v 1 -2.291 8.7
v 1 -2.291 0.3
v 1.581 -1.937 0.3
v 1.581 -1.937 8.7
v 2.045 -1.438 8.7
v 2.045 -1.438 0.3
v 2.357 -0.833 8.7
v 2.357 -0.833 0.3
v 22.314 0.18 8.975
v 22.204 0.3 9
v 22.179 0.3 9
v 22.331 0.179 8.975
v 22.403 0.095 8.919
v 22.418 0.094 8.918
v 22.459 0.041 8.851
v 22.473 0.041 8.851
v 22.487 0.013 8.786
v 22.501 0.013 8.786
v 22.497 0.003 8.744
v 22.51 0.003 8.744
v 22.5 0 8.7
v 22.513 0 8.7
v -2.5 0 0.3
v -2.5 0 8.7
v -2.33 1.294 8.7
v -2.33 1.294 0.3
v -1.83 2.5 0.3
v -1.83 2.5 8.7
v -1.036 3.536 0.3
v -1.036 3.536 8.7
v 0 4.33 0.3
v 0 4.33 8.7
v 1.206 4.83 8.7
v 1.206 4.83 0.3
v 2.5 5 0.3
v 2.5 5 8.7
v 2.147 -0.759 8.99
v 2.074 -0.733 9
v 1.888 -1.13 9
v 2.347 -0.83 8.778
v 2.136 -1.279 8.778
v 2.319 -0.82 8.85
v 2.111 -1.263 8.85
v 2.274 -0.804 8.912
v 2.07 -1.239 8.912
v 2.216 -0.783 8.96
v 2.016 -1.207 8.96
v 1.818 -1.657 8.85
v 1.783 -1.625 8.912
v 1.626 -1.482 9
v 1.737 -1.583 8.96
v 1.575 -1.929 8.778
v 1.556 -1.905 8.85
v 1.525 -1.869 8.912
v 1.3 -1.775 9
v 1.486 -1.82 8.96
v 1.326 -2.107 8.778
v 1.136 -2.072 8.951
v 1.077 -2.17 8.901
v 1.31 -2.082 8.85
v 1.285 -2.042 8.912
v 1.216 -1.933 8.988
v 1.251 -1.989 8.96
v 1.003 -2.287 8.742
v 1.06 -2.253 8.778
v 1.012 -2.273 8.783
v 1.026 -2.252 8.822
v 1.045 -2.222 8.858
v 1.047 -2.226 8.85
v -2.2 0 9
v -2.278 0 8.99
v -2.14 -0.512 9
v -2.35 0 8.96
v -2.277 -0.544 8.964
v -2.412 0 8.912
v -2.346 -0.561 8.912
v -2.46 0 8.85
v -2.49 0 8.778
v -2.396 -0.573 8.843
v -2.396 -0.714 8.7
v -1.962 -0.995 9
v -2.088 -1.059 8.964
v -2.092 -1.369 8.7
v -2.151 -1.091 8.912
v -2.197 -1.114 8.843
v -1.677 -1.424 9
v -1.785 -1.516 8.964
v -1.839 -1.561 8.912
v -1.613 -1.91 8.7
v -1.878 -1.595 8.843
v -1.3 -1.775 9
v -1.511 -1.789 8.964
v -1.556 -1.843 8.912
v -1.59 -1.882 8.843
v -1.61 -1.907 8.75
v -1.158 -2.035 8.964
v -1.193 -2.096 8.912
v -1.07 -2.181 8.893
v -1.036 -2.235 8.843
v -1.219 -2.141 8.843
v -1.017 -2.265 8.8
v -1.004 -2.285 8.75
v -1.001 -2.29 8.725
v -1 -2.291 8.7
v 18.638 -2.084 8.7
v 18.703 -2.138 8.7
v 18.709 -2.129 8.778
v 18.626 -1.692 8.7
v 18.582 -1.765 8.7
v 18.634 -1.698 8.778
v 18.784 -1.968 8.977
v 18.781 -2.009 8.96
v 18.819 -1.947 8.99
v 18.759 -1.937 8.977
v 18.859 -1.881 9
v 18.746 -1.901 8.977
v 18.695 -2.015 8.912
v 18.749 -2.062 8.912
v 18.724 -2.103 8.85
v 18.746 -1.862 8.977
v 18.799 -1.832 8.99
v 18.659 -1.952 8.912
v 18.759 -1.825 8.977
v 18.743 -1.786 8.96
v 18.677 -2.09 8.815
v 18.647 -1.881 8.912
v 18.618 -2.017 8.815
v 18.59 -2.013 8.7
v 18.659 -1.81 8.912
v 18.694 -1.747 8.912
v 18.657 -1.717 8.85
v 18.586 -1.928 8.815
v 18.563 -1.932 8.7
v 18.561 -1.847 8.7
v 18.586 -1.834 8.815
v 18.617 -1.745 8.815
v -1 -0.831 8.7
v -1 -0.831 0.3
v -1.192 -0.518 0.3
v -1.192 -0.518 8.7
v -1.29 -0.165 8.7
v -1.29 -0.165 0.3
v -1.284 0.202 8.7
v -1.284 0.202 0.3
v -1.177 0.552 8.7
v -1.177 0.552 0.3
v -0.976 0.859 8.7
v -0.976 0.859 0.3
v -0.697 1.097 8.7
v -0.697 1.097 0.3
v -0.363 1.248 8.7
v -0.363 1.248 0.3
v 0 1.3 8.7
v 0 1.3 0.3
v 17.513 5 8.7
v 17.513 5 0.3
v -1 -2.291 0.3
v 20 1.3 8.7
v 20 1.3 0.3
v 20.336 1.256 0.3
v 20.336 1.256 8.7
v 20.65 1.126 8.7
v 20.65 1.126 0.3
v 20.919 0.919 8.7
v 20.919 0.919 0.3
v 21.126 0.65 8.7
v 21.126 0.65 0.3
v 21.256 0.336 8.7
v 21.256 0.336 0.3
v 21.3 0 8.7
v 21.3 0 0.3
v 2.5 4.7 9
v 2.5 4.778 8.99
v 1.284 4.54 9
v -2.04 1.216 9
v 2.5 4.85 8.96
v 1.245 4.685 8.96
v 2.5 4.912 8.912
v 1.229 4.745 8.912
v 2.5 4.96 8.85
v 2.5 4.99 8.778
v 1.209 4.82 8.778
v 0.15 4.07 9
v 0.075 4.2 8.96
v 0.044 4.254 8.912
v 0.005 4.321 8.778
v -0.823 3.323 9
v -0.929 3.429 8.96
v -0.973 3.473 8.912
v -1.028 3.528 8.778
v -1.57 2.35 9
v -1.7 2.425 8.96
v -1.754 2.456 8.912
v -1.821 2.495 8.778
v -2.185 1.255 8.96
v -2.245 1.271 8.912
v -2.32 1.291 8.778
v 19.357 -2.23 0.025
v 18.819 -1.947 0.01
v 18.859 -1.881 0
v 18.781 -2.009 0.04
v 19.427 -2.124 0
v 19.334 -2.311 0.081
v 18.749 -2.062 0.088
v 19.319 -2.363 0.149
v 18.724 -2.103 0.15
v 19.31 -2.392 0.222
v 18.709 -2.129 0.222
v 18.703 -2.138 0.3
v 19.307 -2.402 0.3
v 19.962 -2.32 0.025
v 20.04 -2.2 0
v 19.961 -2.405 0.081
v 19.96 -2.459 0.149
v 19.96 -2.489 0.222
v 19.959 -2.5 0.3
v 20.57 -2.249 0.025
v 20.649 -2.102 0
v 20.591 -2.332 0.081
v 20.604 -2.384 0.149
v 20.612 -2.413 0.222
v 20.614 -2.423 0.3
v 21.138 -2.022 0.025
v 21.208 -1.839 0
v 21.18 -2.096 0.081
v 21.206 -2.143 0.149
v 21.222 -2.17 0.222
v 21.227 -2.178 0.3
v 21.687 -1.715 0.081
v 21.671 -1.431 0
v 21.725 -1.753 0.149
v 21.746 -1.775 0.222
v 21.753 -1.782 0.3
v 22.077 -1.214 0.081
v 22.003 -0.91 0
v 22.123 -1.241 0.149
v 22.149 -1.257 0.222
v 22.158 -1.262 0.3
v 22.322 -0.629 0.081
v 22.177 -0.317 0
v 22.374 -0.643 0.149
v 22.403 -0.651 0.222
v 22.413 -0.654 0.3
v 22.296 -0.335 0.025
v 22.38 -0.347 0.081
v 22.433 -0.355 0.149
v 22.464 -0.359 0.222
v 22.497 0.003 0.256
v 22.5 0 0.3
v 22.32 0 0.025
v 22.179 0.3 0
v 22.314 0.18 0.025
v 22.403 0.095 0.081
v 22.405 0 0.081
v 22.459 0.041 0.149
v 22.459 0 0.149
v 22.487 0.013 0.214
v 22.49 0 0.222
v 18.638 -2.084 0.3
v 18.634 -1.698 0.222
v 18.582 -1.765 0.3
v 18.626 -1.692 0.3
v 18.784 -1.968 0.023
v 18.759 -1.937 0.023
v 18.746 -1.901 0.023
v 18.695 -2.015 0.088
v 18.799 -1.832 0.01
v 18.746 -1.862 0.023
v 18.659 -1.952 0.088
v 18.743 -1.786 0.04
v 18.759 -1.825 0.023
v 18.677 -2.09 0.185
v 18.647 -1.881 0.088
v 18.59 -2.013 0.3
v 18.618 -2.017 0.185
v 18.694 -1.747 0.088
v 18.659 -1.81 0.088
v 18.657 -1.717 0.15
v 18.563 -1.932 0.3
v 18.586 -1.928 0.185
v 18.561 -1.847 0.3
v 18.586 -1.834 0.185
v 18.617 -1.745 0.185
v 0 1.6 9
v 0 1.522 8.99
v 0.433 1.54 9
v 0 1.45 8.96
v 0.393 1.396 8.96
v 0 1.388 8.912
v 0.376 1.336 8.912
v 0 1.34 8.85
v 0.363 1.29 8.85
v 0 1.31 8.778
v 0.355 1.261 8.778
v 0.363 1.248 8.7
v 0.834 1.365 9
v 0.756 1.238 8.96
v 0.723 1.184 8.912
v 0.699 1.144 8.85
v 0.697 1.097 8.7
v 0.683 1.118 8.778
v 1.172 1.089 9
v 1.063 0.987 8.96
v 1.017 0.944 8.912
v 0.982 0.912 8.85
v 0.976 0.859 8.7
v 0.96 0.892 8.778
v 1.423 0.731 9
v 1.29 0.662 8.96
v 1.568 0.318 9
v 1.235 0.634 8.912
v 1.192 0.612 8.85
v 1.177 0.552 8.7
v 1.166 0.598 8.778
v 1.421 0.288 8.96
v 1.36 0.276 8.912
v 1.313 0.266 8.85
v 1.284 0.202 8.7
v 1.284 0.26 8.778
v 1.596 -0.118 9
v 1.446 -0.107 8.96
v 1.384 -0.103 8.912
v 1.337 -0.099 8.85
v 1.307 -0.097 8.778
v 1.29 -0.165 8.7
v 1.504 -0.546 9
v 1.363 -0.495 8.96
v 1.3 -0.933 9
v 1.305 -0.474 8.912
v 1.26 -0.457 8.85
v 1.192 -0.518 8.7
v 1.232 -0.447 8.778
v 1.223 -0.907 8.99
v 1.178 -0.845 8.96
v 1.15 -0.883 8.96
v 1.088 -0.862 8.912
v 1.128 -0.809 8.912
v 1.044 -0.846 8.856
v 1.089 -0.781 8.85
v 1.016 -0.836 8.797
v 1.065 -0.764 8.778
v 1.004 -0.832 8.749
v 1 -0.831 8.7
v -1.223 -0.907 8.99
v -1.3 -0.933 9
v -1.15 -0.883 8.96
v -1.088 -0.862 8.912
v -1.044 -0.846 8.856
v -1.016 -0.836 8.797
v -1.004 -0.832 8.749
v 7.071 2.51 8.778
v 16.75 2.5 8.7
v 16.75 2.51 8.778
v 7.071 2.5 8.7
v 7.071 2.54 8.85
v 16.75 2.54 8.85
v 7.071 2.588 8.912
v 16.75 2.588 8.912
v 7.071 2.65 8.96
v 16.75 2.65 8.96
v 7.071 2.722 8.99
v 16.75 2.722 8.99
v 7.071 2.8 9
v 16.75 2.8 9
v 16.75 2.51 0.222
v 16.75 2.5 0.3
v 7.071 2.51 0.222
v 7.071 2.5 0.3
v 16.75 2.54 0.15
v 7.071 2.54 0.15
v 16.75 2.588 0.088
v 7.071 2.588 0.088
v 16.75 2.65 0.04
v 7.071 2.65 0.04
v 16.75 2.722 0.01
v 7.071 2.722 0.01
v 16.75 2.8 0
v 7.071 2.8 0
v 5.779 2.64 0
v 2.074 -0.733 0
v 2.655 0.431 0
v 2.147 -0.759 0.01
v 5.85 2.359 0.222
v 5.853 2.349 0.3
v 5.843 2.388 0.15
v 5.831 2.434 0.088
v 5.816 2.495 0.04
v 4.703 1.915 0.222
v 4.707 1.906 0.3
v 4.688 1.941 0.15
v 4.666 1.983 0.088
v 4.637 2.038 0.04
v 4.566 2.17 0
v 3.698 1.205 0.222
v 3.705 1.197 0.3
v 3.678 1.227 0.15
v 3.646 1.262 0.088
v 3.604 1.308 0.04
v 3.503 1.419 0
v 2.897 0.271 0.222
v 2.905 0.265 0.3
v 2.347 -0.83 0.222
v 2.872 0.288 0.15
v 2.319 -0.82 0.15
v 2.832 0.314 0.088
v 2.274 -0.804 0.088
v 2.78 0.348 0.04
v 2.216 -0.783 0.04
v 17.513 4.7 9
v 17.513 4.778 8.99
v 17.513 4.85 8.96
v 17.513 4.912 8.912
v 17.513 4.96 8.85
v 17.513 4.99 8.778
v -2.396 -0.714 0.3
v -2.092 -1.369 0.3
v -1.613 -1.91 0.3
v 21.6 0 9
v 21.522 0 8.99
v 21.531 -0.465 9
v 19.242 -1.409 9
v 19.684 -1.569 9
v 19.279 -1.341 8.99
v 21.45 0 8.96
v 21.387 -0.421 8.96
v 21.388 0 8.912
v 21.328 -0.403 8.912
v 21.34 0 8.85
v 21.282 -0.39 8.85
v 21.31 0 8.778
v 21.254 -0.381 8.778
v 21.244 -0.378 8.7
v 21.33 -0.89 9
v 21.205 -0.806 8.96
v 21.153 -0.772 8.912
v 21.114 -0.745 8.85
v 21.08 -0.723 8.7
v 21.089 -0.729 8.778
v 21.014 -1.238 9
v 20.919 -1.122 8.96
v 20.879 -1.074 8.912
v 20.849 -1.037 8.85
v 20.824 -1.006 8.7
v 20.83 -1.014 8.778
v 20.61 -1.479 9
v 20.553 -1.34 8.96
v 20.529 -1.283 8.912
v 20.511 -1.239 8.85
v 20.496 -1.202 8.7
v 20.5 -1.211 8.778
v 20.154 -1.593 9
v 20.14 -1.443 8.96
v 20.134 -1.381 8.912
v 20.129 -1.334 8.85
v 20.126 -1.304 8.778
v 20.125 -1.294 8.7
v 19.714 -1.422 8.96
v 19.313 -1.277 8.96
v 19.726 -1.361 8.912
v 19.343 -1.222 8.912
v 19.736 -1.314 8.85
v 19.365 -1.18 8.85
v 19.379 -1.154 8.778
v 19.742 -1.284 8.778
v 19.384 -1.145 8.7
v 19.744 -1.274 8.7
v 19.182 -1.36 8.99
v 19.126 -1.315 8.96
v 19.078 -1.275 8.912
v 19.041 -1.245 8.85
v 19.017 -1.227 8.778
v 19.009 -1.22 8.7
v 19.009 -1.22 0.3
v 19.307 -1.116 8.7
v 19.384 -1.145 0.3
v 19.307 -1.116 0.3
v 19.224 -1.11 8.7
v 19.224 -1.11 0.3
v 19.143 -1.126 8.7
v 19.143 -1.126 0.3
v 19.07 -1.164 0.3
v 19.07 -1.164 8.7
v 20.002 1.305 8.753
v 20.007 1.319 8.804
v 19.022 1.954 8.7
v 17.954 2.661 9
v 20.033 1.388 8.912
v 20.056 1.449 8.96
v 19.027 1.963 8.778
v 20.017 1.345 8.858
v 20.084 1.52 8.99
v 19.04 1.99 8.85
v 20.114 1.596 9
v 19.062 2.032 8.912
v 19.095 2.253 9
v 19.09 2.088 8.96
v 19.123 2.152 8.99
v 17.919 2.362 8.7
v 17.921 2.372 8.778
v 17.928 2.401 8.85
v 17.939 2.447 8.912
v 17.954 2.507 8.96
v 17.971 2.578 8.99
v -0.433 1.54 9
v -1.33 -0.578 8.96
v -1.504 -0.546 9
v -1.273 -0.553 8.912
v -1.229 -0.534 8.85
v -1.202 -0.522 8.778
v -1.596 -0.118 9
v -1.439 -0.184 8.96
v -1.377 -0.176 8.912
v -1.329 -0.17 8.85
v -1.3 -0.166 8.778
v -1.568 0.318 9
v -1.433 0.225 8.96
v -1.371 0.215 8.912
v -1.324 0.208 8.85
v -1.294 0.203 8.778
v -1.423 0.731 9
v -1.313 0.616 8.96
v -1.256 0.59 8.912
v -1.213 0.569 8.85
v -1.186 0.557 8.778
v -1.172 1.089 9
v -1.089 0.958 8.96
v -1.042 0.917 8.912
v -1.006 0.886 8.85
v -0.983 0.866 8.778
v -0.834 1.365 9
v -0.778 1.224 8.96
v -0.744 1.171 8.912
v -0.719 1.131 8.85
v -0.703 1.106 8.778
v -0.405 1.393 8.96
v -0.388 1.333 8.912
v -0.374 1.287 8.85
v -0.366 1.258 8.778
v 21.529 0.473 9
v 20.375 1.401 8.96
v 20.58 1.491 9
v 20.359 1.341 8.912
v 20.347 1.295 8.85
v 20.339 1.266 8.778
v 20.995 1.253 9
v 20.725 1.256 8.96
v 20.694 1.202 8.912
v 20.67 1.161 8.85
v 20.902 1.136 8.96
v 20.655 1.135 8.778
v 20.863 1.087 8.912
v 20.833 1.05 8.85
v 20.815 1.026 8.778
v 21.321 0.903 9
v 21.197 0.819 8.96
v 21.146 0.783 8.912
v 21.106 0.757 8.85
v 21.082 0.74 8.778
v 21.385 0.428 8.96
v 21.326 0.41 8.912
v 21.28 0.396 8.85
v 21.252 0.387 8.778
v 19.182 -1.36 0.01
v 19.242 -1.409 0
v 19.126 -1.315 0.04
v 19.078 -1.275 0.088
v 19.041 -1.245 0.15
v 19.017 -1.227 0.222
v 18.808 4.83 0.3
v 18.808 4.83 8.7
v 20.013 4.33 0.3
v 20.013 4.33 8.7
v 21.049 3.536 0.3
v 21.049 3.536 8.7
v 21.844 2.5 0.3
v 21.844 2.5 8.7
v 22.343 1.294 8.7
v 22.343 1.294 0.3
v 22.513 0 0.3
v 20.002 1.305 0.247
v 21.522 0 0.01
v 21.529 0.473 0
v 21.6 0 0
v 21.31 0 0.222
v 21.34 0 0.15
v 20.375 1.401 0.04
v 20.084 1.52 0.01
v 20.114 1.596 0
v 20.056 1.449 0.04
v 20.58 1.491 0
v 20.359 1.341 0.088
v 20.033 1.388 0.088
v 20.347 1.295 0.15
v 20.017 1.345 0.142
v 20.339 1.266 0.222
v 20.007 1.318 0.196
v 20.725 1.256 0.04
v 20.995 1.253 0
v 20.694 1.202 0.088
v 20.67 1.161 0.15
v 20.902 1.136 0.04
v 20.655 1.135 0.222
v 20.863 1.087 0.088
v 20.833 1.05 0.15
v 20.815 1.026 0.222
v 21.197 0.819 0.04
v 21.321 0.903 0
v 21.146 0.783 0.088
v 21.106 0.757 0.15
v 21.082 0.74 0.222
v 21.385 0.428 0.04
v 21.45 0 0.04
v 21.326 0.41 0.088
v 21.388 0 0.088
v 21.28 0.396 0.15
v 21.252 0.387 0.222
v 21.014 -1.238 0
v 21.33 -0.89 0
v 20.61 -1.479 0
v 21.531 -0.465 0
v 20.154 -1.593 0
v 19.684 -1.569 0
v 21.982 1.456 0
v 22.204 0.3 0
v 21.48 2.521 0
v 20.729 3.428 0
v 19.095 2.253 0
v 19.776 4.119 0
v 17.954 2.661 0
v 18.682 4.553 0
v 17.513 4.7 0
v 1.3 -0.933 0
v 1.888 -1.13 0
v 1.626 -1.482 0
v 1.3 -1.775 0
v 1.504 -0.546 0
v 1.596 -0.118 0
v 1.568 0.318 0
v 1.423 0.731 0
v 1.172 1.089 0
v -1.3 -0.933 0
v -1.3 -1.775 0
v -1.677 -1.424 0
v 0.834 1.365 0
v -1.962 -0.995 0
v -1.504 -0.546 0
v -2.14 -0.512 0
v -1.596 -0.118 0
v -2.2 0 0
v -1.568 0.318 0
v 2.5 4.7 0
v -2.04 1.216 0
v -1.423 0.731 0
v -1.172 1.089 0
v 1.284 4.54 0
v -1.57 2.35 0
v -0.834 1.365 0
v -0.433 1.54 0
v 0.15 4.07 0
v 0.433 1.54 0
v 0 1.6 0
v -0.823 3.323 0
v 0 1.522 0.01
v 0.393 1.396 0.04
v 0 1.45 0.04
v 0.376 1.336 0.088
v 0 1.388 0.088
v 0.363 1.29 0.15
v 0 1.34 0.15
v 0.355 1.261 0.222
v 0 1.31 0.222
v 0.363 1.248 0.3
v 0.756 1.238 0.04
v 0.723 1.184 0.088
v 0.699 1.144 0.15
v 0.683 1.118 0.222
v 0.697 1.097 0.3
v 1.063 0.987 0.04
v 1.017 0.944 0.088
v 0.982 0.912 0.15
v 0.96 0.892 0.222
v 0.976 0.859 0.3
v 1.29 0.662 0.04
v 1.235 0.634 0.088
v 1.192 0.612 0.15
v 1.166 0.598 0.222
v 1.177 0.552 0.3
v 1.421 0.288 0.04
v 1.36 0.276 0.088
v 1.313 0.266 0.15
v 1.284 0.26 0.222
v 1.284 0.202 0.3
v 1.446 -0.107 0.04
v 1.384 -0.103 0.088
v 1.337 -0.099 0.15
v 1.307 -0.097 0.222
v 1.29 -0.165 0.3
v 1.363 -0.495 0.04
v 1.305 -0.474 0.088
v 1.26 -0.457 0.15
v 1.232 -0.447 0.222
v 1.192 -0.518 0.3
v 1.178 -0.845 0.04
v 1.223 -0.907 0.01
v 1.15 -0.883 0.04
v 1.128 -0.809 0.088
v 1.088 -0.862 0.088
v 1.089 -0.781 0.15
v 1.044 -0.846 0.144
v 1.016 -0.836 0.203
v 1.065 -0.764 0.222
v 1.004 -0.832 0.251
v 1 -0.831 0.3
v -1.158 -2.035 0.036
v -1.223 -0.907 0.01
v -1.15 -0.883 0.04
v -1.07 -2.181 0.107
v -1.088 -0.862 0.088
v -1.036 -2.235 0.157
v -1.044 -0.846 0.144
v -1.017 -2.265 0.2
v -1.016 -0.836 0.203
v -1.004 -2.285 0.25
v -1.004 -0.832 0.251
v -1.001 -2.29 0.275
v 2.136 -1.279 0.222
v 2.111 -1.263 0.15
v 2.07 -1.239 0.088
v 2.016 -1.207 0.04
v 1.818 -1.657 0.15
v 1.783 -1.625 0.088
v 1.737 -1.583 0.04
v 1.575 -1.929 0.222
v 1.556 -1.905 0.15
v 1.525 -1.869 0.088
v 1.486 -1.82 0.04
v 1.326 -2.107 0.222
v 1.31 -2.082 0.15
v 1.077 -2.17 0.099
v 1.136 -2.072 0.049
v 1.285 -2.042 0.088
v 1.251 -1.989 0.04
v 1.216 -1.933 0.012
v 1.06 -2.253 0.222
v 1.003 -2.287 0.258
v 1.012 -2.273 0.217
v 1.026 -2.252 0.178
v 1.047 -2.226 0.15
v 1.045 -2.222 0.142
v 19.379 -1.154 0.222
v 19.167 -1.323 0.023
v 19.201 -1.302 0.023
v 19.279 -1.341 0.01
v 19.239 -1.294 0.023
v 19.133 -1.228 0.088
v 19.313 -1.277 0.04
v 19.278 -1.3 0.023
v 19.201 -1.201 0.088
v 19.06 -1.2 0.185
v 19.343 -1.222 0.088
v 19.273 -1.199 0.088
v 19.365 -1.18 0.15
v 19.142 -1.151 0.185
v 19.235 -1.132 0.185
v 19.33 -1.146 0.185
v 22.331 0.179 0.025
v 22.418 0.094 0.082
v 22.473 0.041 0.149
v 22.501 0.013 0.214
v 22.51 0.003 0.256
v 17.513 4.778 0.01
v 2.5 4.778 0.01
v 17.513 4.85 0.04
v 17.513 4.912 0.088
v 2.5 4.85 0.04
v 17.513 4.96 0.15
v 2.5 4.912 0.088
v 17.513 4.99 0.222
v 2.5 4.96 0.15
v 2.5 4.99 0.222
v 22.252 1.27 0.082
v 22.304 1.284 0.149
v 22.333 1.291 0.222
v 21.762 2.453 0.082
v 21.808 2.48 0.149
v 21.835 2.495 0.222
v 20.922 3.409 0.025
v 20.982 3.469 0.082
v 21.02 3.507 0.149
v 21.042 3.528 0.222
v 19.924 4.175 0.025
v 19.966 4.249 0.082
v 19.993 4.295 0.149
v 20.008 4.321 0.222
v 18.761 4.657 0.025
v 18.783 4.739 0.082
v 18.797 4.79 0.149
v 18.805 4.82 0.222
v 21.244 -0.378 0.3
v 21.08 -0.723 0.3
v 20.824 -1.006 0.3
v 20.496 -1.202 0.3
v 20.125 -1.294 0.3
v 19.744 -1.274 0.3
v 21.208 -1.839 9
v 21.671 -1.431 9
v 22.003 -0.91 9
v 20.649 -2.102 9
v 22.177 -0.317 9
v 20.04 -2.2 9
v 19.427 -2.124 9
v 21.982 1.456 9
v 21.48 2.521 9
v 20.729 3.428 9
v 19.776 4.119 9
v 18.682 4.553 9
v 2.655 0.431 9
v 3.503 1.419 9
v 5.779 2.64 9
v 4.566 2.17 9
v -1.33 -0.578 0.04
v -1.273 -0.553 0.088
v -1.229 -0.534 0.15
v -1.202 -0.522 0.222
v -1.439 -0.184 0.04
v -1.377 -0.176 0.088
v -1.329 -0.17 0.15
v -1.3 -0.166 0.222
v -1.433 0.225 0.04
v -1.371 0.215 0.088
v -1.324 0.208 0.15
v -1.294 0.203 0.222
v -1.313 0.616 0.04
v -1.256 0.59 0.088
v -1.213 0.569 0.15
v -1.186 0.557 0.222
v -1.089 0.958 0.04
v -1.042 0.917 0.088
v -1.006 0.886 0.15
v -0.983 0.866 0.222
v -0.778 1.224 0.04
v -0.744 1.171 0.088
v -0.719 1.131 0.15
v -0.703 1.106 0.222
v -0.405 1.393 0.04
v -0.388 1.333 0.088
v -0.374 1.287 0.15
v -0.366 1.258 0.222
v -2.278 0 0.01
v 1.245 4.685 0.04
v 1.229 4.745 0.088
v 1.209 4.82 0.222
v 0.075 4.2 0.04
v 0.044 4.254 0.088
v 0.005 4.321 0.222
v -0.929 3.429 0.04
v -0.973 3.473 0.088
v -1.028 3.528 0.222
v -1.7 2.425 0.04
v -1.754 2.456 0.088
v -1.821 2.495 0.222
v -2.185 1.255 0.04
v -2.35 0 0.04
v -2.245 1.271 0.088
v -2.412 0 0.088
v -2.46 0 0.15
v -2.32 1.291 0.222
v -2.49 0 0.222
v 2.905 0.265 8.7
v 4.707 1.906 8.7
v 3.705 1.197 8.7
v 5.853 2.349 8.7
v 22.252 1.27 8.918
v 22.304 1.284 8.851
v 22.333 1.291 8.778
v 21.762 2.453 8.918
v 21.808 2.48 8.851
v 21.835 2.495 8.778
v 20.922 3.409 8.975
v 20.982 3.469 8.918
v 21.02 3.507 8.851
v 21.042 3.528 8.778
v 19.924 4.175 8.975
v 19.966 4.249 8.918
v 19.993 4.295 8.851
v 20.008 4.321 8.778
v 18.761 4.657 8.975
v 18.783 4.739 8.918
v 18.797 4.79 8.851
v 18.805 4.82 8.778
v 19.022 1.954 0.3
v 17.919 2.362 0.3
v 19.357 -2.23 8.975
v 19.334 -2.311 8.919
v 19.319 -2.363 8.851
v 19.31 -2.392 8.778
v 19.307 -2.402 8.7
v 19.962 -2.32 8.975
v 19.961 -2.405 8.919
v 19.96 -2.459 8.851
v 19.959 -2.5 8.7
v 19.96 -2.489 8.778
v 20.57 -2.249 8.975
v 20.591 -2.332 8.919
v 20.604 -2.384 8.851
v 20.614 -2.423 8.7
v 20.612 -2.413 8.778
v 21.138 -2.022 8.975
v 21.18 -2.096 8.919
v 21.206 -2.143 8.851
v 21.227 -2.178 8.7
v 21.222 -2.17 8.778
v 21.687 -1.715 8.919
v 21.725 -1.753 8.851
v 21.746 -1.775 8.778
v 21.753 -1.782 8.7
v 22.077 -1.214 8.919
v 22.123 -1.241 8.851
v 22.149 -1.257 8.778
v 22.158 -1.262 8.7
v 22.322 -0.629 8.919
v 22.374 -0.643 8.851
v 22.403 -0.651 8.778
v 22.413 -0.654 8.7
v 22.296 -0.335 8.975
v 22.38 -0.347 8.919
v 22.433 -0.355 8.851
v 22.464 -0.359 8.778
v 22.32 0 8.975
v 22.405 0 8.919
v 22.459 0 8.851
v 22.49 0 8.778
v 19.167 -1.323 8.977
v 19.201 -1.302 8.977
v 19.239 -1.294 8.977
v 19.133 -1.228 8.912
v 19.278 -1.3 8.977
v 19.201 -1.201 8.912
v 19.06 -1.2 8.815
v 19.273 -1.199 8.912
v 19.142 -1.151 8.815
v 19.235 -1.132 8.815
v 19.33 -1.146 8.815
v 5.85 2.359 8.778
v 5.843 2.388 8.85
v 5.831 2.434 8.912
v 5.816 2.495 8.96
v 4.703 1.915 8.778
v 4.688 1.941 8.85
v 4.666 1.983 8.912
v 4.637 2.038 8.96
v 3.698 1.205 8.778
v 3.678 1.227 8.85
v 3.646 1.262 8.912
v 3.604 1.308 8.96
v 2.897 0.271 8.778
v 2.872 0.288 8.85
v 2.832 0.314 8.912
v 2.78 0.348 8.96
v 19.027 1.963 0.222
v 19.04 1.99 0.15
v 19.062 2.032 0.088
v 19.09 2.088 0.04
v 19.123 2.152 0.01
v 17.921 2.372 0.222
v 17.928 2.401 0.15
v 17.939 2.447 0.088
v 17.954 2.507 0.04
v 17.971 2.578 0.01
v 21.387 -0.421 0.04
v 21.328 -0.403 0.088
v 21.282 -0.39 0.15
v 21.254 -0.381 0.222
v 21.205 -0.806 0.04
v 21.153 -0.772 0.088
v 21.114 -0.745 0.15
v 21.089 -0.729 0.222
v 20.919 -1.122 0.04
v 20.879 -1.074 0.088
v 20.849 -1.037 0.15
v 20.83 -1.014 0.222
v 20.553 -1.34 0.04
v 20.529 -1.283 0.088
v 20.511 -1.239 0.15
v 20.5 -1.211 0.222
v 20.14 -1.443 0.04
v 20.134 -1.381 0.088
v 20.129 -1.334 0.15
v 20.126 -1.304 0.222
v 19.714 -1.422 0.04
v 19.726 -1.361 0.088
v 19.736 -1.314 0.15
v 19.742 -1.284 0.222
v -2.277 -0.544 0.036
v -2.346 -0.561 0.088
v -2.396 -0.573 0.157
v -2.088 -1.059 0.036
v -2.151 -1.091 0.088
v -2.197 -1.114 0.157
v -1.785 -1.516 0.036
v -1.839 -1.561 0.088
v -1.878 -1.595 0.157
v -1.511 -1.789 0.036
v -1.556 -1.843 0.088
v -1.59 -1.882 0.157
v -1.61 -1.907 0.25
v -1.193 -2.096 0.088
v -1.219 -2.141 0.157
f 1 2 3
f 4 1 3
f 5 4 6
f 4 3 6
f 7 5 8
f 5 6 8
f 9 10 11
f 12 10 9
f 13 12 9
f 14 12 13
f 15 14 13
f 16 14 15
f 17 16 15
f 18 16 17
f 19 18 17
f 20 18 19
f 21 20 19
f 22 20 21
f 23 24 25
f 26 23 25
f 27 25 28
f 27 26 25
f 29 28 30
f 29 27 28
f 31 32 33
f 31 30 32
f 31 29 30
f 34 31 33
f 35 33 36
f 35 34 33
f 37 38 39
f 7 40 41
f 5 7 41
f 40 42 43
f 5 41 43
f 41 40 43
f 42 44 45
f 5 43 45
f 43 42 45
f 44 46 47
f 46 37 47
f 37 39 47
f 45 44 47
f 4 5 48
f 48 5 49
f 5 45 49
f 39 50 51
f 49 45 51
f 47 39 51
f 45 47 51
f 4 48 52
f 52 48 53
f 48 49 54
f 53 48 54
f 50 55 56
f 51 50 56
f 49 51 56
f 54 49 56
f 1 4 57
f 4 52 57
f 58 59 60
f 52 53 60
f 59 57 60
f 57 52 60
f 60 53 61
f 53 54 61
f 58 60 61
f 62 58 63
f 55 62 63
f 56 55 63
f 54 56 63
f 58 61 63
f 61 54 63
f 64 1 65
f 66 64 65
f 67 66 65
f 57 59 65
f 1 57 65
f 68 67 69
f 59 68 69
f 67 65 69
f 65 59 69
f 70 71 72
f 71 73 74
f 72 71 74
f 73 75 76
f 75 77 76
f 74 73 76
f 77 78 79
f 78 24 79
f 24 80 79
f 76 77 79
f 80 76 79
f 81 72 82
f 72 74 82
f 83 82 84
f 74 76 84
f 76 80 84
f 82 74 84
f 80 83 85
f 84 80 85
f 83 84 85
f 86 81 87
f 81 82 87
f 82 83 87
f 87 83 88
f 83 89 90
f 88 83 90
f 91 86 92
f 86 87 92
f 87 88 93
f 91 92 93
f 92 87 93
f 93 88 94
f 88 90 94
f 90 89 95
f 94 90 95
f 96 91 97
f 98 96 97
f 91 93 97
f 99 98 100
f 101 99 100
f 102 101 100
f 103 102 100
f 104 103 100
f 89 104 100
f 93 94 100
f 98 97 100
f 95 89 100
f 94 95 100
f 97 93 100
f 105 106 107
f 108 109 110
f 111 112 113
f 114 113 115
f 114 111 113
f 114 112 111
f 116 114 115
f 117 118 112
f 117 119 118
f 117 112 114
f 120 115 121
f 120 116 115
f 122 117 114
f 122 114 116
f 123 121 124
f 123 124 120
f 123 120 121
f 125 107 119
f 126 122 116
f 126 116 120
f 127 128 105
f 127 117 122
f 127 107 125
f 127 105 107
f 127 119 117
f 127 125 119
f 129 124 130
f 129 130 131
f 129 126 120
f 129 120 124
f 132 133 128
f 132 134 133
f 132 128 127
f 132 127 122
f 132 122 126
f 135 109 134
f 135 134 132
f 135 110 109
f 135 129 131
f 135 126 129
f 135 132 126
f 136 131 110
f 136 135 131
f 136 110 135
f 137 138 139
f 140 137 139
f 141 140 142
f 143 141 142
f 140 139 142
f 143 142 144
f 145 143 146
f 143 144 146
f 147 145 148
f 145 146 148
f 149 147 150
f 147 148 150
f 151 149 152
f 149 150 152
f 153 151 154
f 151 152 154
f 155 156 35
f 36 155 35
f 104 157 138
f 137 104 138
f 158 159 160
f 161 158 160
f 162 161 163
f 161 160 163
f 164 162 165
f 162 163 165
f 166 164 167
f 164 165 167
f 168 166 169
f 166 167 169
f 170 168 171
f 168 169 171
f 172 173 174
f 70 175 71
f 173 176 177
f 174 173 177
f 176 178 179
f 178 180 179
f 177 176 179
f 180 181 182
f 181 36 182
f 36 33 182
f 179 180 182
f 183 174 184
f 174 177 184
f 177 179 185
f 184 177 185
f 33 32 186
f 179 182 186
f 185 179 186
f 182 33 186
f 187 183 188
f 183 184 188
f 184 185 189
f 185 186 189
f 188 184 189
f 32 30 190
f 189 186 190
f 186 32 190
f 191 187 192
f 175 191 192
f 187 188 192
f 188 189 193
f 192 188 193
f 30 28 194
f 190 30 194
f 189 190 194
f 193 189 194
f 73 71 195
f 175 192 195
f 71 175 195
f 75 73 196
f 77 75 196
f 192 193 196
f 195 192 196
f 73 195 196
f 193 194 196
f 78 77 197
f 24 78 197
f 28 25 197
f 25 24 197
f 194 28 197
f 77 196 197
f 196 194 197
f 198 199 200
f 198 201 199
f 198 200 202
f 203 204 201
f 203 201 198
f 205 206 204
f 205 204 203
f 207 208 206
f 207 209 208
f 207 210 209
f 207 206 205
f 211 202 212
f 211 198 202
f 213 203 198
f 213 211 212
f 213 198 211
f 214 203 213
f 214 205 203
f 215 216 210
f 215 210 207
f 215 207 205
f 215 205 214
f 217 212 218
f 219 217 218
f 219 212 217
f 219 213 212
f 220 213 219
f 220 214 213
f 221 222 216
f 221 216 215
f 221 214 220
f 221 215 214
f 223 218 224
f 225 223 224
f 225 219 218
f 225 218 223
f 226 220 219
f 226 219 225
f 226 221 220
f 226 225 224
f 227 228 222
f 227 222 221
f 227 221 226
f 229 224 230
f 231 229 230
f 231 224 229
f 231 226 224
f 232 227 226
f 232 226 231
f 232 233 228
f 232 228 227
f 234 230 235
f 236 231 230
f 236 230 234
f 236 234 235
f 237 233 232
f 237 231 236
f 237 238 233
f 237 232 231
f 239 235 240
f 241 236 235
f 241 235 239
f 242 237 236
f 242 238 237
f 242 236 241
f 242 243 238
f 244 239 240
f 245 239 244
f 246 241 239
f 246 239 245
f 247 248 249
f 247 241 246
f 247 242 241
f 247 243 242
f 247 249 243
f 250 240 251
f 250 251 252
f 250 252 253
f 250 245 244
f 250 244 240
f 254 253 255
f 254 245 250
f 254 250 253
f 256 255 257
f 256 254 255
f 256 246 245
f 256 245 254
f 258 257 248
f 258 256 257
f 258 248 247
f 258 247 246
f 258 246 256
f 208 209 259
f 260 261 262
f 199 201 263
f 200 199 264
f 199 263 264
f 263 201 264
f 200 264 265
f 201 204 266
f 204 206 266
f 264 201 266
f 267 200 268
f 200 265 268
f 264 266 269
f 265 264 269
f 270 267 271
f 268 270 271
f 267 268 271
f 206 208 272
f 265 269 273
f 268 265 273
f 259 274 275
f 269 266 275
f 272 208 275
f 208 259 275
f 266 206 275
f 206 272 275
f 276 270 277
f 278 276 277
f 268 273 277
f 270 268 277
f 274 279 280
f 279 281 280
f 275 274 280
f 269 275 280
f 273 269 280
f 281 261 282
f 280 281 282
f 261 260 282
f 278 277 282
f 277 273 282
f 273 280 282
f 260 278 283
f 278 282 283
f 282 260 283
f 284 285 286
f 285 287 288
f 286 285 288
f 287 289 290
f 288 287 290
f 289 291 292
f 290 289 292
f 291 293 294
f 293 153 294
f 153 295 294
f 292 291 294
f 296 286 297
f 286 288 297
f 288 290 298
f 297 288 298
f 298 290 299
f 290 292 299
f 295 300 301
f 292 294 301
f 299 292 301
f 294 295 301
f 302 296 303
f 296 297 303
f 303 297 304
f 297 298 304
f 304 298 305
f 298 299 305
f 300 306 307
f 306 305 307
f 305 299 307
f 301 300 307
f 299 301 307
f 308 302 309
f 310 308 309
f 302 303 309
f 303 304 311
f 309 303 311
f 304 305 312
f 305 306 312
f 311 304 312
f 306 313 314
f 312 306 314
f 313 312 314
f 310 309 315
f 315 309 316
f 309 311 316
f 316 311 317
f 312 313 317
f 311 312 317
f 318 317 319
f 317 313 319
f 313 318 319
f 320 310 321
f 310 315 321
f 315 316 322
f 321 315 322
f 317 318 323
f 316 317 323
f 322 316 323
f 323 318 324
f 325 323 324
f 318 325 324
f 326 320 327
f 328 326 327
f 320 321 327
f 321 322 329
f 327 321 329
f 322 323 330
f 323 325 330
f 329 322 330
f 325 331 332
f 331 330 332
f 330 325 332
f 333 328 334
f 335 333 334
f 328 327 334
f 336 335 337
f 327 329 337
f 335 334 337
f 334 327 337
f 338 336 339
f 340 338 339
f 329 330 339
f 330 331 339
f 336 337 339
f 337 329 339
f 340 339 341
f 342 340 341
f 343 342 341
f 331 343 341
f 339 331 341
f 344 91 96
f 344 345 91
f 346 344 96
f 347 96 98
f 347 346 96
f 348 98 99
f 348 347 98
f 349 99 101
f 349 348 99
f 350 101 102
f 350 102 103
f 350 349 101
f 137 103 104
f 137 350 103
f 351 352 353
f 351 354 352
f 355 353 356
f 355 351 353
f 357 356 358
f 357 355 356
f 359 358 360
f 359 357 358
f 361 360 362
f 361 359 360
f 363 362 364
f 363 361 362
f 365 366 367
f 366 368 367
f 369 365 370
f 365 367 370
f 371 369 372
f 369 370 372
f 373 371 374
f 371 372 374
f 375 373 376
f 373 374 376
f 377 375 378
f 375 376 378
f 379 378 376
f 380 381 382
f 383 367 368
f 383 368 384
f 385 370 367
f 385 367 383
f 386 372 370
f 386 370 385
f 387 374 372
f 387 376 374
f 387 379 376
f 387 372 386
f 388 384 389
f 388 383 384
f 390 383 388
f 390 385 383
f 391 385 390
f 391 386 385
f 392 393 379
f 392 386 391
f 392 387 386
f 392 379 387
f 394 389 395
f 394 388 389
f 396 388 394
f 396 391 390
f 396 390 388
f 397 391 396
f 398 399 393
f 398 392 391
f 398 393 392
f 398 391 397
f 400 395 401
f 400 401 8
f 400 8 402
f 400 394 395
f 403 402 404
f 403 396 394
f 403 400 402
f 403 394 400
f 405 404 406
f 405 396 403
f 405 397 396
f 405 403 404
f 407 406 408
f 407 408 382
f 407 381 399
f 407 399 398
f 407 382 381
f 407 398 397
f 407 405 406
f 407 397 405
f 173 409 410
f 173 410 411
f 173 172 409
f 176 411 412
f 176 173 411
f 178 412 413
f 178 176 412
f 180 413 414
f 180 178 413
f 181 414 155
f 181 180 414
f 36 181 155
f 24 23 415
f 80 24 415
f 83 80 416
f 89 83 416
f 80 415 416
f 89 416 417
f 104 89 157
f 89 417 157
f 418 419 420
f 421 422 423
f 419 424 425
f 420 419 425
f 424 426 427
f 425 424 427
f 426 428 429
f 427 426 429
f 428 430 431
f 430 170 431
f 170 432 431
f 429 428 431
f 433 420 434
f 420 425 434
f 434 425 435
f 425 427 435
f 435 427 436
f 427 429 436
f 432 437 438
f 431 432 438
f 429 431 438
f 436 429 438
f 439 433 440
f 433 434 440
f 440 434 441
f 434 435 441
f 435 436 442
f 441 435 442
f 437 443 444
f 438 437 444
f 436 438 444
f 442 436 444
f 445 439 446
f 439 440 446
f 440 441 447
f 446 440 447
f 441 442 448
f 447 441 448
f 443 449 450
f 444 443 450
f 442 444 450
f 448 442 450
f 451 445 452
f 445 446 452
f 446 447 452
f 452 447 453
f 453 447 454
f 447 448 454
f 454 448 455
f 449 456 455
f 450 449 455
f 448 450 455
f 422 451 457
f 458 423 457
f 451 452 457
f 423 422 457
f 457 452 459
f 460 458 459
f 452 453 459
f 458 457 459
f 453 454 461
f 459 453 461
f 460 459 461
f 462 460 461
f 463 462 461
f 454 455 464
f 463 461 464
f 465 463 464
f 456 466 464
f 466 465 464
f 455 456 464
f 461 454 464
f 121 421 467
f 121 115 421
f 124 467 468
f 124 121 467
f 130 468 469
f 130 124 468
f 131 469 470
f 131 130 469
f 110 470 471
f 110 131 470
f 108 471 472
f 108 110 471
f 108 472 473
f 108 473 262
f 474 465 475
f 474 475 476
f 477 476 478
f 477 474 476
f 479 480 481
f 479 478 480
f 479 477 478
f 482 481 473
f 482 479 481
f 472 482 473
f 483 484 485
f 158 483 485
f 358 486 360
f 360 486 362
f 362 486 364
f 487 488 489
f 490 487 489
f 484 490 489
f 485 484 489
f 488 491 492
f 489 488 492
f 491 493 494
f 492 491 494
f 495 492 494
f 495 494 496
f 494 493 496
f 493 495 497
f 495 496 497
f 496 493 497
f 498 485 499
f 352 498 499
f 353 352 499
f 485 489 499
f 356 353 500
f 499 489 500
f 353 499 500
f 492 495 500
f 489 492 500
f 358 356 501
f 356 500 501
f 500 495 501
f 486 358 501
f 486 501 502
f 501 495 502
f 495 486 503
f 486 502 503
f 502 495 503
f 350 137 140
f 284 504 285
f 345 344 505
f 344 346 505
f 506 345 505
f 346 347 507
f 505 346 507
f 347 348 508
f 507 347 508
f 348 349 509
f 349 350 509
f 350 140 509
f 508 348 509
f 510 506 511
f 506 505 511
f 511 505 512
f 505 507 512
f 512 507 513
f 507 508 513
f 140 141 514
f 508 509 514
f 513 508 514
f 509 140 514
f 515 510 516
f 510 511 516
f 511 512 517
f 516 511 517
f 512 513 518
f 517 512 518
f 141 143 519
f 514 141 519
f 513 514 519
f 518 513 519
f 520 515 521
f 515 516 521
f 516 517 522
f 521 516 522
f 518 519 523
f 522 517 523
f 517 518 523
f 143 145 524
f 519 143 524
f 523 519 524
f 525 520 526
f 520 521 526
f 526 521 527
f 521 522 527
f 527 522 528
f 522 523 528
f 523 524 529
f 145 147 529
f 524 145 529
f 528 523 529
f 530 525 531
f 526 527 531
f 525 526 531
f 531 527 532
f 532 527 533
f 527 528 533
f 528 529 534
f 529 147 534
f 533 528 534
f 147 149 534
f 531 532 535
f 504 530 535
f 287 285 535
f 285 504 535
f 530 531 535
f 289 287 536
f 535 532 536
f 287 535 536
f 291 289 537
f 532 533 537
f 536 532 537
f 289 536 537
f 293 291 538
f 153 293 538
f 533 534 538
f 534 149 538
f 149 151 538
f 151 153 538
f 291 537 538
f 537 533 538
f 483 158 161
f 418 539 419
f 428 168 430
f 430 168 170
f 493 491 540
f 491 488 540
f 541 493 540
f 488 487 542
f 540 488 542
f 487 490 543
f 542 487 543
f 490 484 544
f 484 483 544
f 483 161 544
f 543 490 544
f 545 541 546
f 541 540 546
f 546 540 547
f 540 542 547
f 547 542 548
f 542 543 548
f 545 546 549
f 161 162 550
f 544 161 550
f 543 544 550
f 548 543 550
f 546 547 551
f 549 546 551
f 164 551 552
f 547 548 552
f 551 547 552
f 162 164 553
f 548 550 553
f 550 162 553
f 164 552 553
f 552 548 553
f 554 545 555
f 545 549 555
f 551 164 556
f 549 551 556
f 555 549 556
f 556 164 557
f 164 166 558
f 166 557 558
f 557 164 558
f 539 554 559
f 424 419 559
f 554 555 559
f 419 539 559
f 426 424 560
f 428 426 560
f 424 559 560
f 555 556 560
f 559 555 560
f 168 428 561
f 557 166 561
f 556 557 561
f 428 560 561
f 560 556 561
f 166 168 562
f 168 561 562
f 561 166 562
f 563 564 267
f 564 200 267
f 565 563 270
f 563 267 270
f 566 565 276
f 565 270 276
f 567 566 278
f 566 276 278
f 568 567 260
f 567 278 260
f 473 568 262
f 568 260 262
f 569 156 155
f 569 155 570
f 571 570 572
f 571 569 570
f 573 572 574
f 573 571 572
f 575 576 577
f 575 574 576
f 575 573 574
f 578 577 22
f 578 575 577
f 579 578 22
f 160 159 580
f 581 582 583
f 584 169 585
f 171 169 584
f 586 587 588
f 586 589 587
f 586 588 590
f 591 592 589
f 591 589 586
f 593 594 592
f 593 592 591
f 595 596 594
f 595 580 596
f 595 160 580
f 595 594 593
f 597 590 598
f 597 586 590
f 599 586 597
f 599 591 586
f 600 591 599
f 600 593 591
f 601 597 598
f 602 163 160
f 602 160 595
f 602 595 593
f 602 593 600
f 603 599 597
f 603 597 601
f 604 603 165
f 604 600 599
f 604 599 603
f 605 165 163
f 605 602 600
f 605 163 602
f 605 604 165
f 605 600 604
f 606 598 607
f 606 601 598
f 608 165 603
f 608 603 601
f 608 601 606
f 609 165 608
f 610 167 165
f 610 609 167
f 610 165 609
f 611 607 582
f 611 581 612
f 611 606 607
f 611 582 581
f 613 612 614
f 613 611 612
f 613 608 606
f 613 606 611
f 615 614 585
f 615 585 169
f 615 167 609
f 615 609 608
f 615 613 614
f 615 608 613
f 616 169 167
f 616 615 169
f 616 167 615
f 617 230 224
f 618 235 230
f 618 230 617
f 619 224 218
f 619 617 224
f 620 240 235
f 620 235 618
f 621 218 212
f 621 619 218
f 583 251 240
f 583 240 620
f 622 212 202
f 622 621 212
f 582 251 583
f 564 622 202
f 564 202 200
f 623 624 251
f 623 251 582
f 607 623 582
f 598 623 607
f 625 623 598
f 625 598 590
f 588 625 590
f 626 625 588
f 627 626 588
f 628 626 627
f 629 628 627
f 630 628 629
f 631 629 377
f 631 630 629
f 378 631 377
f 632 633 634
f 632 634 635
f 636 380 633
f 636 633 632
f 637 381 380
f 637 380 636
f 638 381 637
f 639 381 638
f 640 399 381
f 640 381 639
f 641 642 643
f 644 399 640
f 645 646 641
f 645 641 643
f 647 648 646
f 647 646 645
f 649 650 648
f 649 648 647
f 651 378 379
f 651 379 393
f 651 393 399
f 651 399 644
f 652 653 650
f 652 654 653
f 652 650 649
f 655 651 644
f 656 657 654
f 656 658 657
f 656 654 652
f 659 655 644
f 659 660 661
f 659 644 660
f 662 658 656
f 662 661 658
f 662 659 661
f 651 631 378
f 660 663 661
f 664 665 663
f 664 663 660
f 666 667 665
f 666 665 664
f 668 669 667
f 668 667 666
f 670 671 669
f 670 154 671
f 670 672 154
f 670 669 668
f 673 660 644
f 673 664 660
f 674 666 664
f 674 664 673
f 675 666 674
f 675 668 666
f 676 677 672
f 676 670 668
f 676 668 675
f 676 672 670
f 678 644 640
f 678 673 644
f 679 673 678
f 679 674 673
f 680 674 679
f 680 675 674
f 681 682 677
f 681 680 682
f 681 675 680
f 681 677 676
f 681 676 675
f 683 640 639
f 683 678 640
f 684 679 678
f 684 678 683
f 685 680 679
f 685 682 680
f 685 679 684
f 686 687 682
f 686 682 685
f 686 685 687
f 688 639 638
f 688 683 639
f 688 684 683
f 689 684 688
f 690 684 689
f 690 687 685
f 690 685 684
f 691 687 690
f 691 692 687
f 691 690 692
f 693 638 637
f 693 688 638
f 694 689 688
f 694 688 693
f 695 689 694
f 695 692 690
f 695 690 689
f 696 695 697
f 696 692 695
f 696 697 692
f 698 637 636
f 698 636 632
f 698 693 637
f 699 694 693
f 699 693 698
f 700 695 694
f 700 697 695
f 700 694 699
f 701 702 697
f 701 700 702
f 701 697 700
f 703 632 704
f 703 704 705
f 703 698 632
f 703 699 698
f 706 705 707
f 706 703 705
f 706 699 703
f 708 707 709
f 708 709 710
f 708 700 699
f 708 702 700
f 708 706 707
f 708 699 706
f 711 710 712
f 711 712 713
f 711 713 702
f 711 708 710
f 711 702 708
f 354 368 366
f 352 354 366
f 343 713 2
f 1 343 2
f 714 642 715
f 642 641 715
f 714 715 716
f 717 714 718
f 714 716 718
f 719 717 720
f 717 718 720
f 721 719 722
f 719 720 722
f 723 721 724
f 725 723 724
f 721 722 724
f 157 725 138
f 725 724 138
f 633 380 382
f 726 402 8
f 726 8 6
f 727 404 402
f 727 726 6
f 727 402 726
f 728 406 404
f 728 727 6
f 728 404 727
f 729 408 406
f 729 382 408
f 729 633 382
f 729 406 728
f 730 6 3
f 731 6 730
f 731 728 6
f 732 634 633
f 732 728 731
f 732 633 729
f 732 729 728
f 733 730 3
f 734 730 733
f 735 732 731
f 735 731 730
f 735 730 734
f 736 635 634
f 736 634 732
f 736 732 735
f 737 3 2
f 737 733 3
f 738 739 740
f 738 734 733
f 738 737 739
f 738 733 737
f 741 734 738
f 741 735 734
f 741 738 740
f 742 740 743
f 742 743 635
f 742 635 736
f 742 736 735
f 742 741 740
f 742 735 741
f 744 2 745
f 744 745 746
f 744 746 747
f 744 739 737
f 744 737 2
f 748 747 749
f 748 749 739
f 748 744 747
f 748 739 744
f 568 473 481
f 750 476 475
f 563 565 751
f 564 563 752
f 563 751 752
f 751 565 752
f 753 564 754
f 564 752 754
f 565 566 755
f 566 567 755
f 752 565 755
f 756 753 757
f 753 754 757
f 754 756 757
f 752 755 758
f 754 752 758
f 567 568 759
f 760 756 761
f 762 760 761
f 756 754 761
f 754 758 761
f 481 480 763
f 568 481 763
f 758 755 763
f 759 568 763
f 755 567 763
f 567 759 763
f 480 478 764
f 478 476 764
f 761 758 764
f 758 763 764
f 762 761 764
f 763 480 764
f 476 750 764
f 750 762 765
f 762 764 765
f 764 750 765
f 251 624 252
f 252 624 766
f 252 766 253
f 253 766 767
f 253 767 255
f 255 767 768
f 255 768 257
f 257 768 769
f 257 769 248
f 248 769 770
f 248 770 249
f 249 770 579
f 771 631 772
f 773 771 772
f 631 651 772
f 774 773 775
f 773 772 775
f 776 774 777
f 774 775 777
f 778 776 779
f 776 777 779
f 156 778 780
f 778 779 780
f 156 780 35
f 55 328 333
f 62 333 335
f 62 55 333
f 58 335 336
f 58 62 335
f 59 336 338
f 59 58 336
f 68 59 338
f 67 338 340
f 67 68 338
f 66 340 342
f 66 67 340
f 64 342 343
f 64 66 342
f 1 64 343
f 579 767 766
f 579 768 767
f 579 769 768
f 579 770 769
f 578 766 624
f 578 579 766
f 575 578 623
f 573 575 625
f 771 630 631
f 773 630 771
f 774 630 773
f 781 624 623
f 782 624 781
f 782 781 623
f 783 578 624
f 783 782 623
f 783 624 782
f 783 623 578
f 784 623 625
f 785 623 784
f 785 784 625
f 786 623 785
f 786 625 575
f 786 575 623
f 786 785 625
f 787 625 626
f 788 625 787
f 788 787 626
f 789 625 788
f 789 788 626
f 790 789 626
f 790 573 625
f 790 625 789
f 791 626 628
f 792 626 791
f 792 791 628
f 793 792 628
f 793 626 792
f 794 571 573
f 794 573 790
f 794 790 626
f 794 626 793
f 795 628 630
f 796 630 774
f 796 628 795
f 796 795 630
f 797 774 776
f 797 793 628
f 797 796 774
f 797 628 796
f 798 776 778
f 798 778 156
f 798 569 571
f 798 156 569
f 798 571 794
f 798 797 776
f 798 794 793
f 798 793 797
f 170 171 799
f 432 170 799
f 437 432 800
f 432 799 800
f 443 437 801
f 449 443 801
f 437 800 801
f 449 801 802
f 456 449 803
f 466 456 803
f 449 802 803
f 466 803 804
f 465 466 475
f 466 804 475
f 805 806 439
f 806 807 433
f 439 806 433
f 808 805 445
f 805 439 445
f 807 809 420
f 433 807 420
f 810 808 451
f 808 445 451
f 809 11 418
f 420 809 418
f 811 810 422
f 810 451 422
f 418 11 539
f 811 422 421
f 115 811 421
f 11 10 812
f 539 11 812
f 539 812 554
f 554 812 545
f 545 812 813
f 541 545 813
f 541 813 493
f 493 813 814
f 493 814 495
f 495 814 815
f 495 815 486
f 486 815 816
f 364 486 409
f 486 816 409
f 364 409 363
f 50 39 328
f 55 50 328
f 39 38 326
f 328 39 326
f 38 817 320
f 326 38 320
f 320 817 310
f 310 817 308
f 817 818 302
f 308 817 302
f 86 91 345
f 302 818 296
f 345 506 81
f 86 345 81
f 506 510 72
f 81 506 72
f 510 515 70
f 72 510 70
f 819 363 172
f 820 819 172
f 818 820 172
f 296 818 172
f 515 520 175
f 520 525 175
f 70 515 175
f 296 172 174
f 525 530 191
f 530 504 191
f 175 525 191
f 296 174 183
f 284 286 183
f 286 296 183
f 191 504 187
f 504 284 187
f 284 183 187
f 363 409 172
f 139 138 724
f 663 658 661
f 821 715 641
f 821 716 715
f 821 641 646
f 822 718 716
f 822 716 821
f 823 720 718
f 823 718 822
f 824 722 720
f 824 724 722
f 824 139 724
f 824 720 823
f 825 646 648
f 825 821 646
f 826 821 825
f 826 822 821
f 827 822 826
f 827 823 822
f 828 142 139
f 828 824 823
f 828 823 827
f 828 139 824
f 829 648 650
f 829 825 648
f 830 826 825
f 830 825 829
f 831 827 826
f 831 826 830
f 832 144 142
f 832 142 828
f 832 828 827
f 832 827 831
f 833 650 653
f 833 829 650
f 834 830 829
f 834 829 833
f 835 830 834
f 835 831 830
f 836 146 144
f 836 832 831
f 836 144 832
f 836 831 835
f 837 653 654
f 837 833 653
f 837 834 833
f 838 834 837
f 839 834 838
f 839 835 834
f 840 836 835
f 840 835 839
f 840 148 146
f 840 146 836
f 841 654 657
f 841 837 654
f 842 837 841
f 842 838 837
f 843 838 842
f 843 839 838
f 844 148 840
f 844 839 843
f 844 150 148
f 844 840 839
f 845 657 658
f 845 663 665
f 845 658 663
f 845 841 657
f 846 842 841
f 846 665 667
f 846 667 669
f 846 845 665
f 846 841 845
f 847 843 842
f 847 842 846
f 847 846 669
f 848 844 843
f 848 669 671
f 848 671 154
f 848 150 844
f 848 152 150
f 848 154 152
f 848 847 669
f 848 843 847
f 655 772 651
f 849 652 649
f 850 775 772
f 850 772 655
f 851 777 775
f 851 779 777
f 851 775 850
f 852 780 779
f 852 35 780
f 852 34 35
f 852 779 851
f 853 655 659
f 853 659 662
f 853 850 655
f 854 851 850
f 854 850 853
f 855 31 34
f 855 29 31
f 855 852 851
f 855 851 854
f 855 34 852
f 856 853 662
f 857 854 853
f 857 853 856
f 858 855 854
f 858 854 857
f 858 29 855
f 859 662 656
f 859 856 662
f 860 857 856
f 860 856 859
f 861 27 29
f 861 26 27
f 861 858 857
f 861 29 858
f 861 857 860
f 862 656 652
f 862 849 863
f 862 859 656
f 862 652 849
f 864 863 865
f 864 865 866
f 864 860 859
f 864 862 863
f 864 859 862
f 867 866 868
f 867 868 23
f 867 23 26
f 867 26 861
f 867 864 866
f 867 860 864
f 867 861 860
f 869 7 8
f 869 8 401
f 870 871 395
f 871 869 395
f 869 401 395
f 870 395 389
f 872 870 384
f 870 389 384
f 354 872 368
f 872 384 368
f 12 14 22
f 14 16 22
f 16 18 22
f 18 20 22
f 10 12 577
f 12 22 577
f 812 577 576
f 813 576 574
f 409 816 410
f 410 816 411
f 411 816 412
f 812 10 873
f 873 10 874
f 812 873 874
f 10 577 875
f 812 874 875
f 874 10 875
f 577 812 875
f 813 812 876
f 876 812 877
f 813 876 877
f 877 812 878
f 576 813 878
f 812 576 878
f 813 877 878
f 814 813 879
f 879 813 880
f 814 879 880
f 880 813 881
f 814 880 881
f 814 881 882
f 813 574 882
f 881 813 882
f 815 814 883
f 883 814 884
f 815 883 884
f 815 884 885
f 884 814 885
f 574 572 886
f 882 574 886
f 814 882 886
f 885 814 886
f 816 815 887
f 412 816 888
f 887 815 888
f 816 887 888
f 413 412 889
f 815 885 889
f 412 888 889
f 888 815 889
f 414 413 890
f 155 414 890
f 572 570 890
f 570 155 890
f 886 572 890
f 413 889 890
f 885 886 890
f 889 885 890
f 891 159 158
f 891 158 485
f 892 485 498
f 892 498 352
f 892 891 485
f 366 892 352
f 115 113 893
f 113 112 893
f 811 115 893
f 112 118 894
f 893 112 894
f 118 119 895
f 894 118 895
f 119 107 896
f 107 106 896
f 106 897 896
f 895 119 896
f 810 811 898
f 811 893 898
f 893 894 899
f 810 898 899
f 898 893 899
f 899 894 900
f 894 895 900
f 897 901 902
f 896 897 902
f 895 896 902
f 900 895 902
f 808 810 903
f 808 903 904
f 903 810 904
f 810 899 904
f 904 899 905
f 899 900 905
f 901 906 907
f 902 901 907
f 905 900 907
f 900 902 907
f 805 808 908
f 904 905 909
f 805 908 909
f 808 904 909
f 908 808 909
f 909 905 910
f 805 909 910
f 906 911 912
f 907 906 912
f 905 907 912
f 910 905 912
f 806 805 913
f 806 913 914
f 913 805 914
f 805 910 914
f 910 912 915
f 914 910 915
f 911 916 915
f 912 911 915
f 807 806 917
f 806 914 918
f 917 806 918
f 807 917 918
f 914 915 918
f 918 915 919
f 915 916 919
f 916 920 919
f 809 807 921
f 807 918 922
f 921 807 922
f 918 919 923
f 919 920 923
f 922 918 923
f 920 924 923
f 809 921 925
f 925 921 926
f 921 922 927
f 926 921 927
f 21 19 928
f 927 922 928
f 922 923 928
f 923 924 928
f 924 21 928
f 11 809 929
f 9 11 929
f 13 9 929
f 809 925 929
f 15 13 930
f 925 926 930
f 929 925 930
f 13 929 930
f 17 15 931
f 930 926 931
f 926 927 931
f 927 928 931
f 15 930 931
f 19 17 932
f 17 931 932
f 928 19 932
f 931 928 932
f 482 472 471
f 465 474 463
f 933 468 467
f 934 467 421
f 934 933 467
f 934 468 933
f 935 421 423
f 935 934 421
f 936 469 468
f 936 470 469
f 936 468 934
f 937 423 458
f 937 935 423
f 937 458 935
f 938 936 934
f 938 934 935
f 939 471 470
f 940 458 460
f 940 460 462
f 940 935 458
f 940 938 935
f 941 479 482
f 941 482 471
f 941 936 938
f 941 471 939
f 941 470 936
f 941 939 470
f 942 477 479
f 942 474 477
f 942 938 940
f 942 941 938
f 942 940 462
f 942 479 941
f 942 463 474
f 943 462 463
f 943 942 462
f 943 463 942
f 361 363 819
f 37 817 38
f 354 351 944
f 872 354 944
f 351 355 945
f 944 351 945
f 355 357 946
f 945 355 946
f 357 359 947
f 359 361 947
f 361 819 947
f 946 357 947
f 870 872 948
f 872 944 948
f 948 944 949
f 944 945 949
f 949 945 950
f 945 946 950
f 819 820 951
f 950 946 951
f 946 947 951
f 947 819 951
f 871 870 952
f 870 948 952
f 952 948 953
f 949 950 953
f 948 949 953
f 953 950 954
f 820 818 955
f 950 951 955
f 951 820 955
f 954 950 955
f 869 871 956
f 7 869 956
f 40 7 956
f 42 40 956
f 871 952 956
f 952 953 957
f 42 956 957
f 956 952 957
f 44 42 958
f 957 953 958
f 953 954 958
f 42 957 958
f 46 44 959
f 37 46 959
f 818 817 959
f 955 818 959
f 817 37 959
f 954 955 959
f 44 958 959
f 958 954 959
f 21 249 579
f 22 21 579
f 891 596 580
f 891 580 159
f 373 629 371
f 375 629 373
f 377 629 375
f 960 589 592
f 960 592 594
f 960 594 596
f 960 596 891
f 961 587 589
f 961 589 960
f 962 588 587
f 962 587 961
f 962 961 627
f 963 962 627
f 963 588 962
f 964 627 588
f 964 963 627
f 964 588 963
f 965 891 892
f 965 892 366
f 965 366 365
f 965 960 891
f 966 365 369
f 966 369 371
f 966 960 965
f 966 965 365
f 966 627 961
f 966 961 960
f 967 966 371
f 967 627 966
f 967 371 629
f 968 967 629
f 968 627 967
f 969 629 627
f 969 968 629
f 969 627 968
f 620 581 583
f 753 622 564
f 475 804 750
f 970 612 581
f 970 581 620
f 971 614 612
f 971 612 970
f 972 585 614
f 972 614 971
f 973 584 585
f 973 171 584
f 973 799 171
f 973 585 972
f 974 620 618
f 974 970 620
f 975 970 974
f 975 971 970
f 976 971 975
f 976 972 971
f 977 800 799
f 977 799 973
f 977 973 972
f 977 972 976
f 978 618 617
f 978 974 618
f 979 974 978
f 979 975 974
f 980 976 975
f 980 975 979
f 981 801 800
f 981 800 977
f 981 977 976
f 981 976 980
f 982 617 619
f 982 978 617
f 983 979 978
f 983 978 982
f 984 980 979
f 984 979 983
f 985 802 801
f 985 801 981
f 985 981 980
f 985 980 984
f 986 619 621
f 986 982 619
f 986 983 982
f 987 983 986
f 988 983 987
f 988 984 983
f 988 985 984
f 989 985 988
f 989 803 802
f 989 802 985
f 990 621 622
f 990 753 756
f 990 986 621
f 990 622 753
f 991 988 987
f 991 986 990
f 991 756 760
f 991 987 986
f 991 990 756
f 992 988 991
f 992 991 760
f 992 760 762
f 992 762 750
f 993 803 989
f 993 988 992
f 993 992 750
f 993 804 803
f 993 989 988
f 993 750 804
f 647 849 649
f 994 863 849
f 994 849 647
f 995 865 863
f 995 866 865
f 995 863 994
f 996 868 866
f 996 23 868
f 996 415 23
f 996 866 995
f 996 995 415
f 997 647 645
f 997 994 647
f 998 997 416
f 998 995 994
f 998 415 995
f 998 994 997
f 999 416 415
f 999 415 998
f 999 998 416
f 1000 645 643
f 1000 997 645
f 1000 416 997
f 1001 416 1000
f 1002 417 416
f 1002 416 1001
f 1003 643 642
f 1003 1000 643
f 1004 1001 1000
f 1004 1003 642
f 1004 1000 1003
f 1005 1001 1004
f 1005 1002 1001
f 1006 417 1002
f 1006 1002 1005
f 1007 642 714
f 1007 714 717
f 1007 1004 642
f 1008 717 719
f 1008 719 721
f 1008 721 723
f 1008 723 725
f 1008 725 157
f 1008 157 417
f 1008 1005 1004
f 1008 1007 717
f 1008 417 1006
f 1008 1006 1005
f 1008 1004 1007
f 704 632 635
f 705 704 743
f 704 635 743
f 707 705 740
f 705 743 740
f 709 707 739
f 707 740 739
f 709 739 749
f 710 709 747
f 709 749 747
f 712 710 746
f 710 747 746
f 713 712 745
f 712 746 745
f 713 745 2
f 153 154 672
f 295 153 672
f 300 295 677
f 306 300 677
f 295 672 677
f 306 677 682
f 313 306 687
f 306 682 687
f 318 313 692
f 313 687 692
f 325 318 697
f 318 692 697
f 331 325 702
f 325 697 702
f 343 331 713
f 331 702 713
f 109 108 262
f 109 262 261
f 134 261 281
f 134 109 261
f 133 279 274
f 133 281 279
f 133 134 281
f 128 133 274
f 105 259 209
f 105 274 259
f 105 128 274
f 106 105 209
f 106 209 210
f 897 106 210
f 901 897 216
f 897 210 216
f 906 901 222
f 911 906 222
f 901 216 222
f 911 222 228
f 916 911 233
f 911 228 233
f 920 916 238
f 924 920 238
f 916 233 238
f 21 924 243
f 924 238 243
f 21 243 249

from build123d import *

# Parameters (mm, degrees)
F1_DEPTH    = 9
F2_T1_DEPTH = 9
F2_T3_DEPTH = 9
F2_T5_DEPTH = 34
F2_T7_DEPTH = 34
F3_R        = 0.3


# Not quite as in the source:
# - a fillet or chamfer that OpenCascade refuses, or shapes differently, is made with other operations: its cross-section is extruded or revolved along the edge and cut away or added


with BuildPart() as f1:
    # F0 (on Top) → F1 (new body)
    with BuildSketch(Plane.XY):
        with BuildLine():
            Line((-2.5, 5), (-2.5, 0))
            ThreePointArc((-2.5, 0), (-2.0916500663, -1.3693063938), (-1, -2.2912878475))
            Line((-1, -2.2912878475), (-1, -0.8306623863))
            ThreePointArc((-1, -0.8306623863), (-1.1768307232, 0.5523309234), (0, 1.3))
            ThreePointArc((0, 1.3), (1.1768307232, 0.5523309234), (1, -0.8306623863))
            Line((1, -0.8306623863), (1, -2.2912878475))
            ThreePointArc((1, -2.2912878475), (2.0916500663, -1.3693063938), (2.5, 0))
            Line((2.5, 0), (2.5, 2.5))
            Line((2.5, 2.5), (20, 2.5))
            ThreePointArc((20, 2.5), (21.767766953, 1.767766953), (22.5, 0))
            Line((22.5, 0), (22.5134724528, 0))
            Line((22.5134724528, 0), (22.5134724528, 5))
            Line((22.5134724528, 5), (-2.5, 5))
        make_face()
        with BuildLine():
            ThreePointArc((18.4241019781, -1.9407589815), (21.074768567, -2.2571824311), (22.5, 0))
            Line((22.5, 0), (21.3, 0))
            ThreePointArc((21.3, 0), (20.5588796548, -1.1737348642), (19.1805330286, -1.0091946704))
            Line((19.1805330286, -1.0091946704), (18.4241019781, -1.9407589815))
        make_face()
        with BuildLine():
            Line((21.3, 0), (22.5, 0))
            ThreePointArc((22.5, 0), (21.767766953, 1.767766953), (20, 2.5))
            Line((20, 2.5), (20, 1.3))
            ThreePointArc((20, 1.3), (20.9192388155, 0.9192388155), (21.3, 0))
        make_face()
    extrude(amount=F1_DEPTH)

    # F2: fillet of radius 5 on 4 edges, made by hand

    # F2_s2 → F2_t1 (join)
    with BuildSketch(Plane.XY):
        with BuildLine():
            ThreePointArc((2.357022604, -0.8333333333), (4.1843164659, 1.5824829046), (7.0710678119, 2.5))
            Line((7.0710678119, 2.5), (7.0710678119, 3))
            Line((7.0710678119, 3), (2.5, 3))
            Line((2.5, 3), (2, 2.5))
            ThreePointArc((2, 2.5), (2, 0), (1.8856180832, -0.6666666667))
            Line((1.8856180832, -0.6666666667), (2.357022604, -0.8333333333))
        make_face()
    extrude(amount=F2_T1_DEPTH)

    # F2_s4 → F2_t3 (join)
    with BuildSketch(Plane.XY):
        with BuildLine():
            ThreePointArc((20, 1.3), (18.4824354457, 2.1904157598), (16.7503846381, 2.5))
            Line((16.7503846381, 2.5), (20, 2.5))
            Line((20, 2.5), (20, 1.3))
        make_face()
    extrude(amount=F2_T3_DEPTH)

    # F2_s6 → F2_t5 (cut)
    with BuildSketch(Plane.XY.offset(-12.5)):
        with BuildLine():
            ThreePointArc((-2.5, 0), (-1.0355339059, 3.5355339059), (2.5, 5))
            Line((2.5, 5), (-2.5, 5))
            Line((-2.5, 5), (-2.5, 0))
        make_face()
    extrude(amount=F2_T5_DEPTH, mode=Mode.SUBTRACT)

    # F2_s8 → F2_t7 (cut)
    with BuildSketch(Plane.XY.offset(-12.5)):
        with BuildLine():
            ThreePointArc((17.5134724528, 5), (21.0490063587, 3.5355339059), (22.5134724528, 0))
            Line((22.5134724528, 0), (22.5134724528, 5))
            Line((22.5134724528, 5), (17.5134724528, 5))
        make_face()
    extrude(amount=F2_T7_DEPTH, mode=Mode.SUBTRACT)

    # F3
    f3_edges = [f1.edges().sort_by_distance(p)[0] for p in [
        (22.506736, 0, 9),
        (21.074769, -2.257182, 9),
        (18.802318, -1.474977, 9),
        (21.225143, -0.434768, 9),
        (18.482435, 2.190416, 9),
        (11.910726, 2.5, 9),
        (4.184316, 1.582483, 9),
        (1.829975, -1.703289, 9),
        (1, -1.560975, 9),
        (0, 1.3, 9),
        (-1, -1.560975, 9),
        (-2.09165, -1.369306, 9),
        (-1.035534, 3.535534, 9),
        (10.006736, 5, 9),
        (21.049006, 3.535534, 9),
        (22.506736, 0, 0),
        (21.074769, -2.257182, 0),
        (18.802318, -1.474977, 0),
        (21.225143, -0.434768, 0),
        (18.482435, 2.190416, 0),
        (11.910726, 2.5, 0),
        (4.184316, 1.582483, 0),
        (1.829975, -1.703289, 0),
        (1, -1.560975, 0),
        (0, 1.3, 0),
        (-1, -1.560975, 0),
        (-2.09165, -1.369306, 0),
        (-1.035534, 3.535534, 0),
        (10.006736, 5, 0),
        (21.049006, 3.535534, 0),
        (19.180533, -1.009195, 4.5),
        (18.424102, -1.940759, 4.5),
    ]]
    fillet(f3_edges, radius=F3_R)


solid = f1.part
